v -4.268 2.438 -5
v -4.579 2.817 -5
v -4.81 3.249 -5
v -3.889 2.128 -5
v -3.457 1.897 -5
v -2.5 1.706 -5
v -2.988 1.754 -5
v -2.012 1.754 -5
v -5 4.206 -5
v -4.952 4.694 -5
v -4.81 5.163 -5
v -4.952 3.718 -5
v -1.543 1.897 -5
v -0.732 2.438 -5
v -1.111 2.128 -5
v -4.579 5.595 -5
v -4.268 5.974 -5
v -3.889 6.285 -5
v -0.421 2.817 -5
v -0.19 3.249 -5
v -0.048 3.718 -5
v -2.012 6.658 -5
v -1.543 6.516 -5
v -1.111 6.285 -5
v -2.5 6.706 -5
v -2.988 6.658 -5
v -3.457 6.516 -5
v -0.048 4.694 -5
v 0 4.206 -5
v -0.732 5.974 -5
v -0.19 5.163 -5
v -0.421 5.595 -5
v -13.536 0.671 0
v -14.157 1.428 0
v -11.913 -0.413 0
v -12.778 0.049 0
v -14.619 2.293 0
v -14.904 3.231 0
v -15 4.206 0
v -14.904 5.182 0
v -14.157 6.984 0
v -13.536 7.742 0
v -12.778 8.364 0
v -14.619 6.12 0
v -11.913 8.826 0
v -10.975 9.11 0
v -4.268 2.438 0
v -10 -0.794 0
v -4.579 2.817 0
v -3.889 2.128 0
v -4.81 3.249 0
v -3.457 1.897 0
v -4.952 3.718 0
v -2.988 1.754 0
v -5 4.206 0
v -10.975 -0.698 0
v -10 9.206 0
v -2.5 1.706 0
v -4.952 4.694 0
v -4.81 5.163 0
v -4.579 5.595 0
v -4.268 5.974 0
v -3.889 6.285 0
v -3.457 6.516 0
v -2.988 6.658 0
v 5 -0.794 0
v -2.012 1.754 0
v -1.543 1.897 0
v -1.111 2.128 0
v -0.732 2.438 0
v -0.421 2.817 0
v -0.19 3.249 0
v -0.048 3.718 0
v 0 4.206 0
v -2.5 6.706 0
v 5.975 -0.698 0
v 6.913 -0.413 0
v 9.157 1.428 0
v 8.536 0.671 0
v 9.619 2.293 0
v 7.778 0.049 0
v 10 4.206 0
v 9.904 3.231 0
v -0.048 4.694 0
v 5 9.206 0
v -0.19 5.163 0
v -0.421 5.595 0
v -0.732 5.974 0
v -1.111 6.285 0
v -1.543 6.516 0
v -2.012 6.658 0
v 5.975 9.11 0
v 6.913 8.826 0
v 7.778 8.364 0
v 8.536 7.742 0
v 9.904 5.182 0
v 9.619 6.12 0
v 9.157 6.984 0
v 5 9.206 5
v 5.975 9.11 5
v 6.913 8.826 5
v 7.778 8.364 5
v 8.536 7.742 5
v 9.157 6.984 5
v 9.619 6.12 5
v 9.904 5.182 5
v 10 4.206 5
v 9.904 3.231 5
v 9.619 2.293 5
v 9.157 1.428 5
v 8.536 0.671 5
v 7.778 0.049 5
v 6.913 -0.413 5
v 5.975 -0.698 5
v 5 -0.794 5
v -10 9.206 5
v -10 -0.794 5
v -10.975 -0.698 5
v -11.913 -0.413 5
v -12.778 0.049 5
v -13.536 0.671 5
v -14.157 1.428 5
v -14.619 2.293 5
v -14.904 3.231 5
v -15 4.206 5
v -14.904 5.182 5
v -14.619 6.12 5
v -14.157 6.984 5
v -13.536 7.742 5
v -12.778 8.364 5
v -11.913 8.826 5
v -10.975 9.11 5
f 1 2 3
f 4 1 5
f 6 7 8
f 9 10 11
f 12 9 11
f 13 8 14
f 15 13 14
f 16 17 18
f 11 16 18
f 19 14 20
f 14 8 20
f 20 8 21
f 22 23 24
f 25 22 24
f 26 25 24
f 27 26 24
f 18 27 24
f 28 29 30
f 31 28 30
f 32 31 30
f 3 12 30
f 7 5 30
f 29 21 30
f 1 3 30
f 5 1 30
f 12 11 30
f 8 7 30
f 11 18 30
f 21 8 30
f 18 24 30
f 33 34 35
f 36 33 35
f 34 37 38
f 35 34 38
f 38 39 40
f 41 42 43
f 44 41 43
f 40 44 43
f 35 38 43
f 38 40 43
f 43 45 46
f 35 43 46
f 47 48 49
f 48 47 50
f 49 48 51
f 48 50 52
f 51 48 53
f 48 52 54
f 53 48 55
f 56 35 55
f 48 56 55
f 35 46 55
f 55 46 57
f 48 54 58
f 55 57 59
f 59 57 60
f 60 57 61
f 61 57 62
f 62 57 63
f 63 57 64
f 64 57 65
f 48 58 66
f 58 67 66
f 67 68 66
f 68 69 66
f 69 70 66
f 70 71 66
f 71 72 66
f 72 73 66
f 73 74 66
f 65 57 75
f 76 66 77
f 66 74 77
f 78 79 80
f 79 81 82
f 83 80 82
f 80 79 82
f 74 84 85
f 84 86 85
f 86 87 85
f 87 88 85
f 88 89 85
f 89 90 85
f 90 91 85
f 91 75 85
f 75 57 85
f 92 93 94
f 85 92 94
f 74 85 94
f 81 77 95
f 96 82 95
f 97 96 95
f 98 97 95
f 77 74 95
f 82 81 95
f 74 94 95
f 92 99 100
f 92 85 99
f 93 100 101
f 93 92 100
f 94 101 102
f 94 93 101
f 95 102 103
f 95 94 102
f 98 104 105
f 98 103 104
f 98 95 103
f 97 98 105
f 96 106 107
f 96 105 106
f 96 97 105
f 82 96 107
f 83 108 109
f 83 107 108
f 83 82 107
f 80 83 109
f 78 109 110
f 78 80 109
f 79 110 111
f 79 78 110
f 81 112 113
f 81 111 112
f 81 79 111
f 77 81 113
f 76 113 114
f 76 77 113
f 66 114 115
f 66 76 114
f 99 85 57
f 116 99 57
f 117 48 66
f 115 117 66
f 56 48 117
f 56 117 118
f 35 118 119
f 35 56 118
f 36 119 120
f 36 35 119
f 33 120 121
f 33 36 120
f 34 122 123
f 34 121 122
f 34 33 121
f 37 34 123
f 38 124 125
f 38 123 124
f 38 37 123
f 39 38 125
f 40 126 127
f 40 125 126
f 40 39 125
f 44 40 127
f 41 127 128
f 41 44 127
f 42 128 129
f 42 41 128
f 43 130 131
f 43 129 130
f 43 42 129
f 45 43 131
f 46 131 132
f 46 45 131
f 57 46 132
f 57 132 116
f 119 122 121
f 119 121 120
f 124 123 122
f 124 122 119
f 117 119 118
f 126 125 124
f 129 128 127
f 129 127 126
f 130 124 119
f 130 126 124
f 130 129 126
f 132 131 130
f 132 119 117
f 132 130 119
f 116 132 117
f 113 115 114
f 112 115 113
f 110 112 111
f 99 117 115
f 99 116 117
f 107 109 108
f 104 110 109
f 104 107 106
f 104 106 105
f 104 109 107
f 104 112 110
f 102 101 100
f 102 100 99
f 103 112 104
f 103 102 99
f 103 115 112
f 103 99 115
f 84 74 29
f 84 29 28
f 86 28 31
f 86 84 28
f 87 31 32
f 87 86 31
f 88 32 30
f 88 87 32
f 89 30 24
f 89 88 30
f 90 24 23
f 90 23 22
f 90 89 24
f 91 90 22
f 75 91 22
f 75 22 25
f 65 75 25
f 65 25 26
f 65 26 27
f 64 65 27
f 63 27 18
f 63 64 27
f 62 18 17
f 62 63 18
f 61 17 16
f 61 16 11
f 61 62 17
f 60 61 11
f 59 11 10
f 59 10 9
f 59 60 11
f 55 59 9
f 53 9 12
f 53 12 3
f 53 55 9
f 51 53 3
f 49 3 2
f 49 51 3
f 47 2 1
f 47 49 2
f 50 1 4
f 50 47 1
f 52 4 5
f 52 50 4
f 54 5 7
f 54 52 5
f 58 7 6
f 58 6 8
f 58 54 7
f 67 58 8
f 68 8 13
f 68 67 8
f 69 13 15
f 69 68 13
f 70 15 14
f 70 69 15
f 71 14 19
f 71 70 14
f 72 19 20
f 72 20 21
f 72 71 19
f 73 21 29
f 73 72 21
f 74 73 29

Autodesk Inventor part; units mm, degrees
ref_plane "YZ Plane" through (0, 0, 0) normal (1, 0, 0) x (0, 1, 0)
ref_plane "XZ Plane" through (0, 0, 0) normal (0, 1, 0) x (-1, 0, 0)
ref_plane "XY Plane" through (0, 0, 0) normal (0, 0, 1) x (1, 0, 0)
sketch "Sketch1" plane through (0, 0, 0) normal (0, 0, 1) x (1, 0, 0)
  line L0 (-10, 4.2062) -> (5, 4.2062) construction
  line L1 (-10, -0.7938) -> (5, -0.7938)
  line L2 (5, 9.2062) -> (-10, 9.2062)
  arc A0 (-10, 9.2062) -> (-10, -0.7938) centre (-10, 4.2062) ccw
  arc A1 (5, -0.7938) -> (5, 9.2062) centre (5, 4.2062) ccw
  circle A2 centre (-2.5, 4.2062) radius 2.5
  point P0 (0, 0)
  dimension "d0" = 10
  dimension "d1" = 5
  dimension "d11" = 15
extrude "Extrusion3" add sketch "Sketch1" along normal blind 5 contours A0 L2 A1 L1 | A2
extrude "Extrusion4" add sketch "Sketch1" against normal blind 5 contours A2
properties material "Copper, Alloy"
